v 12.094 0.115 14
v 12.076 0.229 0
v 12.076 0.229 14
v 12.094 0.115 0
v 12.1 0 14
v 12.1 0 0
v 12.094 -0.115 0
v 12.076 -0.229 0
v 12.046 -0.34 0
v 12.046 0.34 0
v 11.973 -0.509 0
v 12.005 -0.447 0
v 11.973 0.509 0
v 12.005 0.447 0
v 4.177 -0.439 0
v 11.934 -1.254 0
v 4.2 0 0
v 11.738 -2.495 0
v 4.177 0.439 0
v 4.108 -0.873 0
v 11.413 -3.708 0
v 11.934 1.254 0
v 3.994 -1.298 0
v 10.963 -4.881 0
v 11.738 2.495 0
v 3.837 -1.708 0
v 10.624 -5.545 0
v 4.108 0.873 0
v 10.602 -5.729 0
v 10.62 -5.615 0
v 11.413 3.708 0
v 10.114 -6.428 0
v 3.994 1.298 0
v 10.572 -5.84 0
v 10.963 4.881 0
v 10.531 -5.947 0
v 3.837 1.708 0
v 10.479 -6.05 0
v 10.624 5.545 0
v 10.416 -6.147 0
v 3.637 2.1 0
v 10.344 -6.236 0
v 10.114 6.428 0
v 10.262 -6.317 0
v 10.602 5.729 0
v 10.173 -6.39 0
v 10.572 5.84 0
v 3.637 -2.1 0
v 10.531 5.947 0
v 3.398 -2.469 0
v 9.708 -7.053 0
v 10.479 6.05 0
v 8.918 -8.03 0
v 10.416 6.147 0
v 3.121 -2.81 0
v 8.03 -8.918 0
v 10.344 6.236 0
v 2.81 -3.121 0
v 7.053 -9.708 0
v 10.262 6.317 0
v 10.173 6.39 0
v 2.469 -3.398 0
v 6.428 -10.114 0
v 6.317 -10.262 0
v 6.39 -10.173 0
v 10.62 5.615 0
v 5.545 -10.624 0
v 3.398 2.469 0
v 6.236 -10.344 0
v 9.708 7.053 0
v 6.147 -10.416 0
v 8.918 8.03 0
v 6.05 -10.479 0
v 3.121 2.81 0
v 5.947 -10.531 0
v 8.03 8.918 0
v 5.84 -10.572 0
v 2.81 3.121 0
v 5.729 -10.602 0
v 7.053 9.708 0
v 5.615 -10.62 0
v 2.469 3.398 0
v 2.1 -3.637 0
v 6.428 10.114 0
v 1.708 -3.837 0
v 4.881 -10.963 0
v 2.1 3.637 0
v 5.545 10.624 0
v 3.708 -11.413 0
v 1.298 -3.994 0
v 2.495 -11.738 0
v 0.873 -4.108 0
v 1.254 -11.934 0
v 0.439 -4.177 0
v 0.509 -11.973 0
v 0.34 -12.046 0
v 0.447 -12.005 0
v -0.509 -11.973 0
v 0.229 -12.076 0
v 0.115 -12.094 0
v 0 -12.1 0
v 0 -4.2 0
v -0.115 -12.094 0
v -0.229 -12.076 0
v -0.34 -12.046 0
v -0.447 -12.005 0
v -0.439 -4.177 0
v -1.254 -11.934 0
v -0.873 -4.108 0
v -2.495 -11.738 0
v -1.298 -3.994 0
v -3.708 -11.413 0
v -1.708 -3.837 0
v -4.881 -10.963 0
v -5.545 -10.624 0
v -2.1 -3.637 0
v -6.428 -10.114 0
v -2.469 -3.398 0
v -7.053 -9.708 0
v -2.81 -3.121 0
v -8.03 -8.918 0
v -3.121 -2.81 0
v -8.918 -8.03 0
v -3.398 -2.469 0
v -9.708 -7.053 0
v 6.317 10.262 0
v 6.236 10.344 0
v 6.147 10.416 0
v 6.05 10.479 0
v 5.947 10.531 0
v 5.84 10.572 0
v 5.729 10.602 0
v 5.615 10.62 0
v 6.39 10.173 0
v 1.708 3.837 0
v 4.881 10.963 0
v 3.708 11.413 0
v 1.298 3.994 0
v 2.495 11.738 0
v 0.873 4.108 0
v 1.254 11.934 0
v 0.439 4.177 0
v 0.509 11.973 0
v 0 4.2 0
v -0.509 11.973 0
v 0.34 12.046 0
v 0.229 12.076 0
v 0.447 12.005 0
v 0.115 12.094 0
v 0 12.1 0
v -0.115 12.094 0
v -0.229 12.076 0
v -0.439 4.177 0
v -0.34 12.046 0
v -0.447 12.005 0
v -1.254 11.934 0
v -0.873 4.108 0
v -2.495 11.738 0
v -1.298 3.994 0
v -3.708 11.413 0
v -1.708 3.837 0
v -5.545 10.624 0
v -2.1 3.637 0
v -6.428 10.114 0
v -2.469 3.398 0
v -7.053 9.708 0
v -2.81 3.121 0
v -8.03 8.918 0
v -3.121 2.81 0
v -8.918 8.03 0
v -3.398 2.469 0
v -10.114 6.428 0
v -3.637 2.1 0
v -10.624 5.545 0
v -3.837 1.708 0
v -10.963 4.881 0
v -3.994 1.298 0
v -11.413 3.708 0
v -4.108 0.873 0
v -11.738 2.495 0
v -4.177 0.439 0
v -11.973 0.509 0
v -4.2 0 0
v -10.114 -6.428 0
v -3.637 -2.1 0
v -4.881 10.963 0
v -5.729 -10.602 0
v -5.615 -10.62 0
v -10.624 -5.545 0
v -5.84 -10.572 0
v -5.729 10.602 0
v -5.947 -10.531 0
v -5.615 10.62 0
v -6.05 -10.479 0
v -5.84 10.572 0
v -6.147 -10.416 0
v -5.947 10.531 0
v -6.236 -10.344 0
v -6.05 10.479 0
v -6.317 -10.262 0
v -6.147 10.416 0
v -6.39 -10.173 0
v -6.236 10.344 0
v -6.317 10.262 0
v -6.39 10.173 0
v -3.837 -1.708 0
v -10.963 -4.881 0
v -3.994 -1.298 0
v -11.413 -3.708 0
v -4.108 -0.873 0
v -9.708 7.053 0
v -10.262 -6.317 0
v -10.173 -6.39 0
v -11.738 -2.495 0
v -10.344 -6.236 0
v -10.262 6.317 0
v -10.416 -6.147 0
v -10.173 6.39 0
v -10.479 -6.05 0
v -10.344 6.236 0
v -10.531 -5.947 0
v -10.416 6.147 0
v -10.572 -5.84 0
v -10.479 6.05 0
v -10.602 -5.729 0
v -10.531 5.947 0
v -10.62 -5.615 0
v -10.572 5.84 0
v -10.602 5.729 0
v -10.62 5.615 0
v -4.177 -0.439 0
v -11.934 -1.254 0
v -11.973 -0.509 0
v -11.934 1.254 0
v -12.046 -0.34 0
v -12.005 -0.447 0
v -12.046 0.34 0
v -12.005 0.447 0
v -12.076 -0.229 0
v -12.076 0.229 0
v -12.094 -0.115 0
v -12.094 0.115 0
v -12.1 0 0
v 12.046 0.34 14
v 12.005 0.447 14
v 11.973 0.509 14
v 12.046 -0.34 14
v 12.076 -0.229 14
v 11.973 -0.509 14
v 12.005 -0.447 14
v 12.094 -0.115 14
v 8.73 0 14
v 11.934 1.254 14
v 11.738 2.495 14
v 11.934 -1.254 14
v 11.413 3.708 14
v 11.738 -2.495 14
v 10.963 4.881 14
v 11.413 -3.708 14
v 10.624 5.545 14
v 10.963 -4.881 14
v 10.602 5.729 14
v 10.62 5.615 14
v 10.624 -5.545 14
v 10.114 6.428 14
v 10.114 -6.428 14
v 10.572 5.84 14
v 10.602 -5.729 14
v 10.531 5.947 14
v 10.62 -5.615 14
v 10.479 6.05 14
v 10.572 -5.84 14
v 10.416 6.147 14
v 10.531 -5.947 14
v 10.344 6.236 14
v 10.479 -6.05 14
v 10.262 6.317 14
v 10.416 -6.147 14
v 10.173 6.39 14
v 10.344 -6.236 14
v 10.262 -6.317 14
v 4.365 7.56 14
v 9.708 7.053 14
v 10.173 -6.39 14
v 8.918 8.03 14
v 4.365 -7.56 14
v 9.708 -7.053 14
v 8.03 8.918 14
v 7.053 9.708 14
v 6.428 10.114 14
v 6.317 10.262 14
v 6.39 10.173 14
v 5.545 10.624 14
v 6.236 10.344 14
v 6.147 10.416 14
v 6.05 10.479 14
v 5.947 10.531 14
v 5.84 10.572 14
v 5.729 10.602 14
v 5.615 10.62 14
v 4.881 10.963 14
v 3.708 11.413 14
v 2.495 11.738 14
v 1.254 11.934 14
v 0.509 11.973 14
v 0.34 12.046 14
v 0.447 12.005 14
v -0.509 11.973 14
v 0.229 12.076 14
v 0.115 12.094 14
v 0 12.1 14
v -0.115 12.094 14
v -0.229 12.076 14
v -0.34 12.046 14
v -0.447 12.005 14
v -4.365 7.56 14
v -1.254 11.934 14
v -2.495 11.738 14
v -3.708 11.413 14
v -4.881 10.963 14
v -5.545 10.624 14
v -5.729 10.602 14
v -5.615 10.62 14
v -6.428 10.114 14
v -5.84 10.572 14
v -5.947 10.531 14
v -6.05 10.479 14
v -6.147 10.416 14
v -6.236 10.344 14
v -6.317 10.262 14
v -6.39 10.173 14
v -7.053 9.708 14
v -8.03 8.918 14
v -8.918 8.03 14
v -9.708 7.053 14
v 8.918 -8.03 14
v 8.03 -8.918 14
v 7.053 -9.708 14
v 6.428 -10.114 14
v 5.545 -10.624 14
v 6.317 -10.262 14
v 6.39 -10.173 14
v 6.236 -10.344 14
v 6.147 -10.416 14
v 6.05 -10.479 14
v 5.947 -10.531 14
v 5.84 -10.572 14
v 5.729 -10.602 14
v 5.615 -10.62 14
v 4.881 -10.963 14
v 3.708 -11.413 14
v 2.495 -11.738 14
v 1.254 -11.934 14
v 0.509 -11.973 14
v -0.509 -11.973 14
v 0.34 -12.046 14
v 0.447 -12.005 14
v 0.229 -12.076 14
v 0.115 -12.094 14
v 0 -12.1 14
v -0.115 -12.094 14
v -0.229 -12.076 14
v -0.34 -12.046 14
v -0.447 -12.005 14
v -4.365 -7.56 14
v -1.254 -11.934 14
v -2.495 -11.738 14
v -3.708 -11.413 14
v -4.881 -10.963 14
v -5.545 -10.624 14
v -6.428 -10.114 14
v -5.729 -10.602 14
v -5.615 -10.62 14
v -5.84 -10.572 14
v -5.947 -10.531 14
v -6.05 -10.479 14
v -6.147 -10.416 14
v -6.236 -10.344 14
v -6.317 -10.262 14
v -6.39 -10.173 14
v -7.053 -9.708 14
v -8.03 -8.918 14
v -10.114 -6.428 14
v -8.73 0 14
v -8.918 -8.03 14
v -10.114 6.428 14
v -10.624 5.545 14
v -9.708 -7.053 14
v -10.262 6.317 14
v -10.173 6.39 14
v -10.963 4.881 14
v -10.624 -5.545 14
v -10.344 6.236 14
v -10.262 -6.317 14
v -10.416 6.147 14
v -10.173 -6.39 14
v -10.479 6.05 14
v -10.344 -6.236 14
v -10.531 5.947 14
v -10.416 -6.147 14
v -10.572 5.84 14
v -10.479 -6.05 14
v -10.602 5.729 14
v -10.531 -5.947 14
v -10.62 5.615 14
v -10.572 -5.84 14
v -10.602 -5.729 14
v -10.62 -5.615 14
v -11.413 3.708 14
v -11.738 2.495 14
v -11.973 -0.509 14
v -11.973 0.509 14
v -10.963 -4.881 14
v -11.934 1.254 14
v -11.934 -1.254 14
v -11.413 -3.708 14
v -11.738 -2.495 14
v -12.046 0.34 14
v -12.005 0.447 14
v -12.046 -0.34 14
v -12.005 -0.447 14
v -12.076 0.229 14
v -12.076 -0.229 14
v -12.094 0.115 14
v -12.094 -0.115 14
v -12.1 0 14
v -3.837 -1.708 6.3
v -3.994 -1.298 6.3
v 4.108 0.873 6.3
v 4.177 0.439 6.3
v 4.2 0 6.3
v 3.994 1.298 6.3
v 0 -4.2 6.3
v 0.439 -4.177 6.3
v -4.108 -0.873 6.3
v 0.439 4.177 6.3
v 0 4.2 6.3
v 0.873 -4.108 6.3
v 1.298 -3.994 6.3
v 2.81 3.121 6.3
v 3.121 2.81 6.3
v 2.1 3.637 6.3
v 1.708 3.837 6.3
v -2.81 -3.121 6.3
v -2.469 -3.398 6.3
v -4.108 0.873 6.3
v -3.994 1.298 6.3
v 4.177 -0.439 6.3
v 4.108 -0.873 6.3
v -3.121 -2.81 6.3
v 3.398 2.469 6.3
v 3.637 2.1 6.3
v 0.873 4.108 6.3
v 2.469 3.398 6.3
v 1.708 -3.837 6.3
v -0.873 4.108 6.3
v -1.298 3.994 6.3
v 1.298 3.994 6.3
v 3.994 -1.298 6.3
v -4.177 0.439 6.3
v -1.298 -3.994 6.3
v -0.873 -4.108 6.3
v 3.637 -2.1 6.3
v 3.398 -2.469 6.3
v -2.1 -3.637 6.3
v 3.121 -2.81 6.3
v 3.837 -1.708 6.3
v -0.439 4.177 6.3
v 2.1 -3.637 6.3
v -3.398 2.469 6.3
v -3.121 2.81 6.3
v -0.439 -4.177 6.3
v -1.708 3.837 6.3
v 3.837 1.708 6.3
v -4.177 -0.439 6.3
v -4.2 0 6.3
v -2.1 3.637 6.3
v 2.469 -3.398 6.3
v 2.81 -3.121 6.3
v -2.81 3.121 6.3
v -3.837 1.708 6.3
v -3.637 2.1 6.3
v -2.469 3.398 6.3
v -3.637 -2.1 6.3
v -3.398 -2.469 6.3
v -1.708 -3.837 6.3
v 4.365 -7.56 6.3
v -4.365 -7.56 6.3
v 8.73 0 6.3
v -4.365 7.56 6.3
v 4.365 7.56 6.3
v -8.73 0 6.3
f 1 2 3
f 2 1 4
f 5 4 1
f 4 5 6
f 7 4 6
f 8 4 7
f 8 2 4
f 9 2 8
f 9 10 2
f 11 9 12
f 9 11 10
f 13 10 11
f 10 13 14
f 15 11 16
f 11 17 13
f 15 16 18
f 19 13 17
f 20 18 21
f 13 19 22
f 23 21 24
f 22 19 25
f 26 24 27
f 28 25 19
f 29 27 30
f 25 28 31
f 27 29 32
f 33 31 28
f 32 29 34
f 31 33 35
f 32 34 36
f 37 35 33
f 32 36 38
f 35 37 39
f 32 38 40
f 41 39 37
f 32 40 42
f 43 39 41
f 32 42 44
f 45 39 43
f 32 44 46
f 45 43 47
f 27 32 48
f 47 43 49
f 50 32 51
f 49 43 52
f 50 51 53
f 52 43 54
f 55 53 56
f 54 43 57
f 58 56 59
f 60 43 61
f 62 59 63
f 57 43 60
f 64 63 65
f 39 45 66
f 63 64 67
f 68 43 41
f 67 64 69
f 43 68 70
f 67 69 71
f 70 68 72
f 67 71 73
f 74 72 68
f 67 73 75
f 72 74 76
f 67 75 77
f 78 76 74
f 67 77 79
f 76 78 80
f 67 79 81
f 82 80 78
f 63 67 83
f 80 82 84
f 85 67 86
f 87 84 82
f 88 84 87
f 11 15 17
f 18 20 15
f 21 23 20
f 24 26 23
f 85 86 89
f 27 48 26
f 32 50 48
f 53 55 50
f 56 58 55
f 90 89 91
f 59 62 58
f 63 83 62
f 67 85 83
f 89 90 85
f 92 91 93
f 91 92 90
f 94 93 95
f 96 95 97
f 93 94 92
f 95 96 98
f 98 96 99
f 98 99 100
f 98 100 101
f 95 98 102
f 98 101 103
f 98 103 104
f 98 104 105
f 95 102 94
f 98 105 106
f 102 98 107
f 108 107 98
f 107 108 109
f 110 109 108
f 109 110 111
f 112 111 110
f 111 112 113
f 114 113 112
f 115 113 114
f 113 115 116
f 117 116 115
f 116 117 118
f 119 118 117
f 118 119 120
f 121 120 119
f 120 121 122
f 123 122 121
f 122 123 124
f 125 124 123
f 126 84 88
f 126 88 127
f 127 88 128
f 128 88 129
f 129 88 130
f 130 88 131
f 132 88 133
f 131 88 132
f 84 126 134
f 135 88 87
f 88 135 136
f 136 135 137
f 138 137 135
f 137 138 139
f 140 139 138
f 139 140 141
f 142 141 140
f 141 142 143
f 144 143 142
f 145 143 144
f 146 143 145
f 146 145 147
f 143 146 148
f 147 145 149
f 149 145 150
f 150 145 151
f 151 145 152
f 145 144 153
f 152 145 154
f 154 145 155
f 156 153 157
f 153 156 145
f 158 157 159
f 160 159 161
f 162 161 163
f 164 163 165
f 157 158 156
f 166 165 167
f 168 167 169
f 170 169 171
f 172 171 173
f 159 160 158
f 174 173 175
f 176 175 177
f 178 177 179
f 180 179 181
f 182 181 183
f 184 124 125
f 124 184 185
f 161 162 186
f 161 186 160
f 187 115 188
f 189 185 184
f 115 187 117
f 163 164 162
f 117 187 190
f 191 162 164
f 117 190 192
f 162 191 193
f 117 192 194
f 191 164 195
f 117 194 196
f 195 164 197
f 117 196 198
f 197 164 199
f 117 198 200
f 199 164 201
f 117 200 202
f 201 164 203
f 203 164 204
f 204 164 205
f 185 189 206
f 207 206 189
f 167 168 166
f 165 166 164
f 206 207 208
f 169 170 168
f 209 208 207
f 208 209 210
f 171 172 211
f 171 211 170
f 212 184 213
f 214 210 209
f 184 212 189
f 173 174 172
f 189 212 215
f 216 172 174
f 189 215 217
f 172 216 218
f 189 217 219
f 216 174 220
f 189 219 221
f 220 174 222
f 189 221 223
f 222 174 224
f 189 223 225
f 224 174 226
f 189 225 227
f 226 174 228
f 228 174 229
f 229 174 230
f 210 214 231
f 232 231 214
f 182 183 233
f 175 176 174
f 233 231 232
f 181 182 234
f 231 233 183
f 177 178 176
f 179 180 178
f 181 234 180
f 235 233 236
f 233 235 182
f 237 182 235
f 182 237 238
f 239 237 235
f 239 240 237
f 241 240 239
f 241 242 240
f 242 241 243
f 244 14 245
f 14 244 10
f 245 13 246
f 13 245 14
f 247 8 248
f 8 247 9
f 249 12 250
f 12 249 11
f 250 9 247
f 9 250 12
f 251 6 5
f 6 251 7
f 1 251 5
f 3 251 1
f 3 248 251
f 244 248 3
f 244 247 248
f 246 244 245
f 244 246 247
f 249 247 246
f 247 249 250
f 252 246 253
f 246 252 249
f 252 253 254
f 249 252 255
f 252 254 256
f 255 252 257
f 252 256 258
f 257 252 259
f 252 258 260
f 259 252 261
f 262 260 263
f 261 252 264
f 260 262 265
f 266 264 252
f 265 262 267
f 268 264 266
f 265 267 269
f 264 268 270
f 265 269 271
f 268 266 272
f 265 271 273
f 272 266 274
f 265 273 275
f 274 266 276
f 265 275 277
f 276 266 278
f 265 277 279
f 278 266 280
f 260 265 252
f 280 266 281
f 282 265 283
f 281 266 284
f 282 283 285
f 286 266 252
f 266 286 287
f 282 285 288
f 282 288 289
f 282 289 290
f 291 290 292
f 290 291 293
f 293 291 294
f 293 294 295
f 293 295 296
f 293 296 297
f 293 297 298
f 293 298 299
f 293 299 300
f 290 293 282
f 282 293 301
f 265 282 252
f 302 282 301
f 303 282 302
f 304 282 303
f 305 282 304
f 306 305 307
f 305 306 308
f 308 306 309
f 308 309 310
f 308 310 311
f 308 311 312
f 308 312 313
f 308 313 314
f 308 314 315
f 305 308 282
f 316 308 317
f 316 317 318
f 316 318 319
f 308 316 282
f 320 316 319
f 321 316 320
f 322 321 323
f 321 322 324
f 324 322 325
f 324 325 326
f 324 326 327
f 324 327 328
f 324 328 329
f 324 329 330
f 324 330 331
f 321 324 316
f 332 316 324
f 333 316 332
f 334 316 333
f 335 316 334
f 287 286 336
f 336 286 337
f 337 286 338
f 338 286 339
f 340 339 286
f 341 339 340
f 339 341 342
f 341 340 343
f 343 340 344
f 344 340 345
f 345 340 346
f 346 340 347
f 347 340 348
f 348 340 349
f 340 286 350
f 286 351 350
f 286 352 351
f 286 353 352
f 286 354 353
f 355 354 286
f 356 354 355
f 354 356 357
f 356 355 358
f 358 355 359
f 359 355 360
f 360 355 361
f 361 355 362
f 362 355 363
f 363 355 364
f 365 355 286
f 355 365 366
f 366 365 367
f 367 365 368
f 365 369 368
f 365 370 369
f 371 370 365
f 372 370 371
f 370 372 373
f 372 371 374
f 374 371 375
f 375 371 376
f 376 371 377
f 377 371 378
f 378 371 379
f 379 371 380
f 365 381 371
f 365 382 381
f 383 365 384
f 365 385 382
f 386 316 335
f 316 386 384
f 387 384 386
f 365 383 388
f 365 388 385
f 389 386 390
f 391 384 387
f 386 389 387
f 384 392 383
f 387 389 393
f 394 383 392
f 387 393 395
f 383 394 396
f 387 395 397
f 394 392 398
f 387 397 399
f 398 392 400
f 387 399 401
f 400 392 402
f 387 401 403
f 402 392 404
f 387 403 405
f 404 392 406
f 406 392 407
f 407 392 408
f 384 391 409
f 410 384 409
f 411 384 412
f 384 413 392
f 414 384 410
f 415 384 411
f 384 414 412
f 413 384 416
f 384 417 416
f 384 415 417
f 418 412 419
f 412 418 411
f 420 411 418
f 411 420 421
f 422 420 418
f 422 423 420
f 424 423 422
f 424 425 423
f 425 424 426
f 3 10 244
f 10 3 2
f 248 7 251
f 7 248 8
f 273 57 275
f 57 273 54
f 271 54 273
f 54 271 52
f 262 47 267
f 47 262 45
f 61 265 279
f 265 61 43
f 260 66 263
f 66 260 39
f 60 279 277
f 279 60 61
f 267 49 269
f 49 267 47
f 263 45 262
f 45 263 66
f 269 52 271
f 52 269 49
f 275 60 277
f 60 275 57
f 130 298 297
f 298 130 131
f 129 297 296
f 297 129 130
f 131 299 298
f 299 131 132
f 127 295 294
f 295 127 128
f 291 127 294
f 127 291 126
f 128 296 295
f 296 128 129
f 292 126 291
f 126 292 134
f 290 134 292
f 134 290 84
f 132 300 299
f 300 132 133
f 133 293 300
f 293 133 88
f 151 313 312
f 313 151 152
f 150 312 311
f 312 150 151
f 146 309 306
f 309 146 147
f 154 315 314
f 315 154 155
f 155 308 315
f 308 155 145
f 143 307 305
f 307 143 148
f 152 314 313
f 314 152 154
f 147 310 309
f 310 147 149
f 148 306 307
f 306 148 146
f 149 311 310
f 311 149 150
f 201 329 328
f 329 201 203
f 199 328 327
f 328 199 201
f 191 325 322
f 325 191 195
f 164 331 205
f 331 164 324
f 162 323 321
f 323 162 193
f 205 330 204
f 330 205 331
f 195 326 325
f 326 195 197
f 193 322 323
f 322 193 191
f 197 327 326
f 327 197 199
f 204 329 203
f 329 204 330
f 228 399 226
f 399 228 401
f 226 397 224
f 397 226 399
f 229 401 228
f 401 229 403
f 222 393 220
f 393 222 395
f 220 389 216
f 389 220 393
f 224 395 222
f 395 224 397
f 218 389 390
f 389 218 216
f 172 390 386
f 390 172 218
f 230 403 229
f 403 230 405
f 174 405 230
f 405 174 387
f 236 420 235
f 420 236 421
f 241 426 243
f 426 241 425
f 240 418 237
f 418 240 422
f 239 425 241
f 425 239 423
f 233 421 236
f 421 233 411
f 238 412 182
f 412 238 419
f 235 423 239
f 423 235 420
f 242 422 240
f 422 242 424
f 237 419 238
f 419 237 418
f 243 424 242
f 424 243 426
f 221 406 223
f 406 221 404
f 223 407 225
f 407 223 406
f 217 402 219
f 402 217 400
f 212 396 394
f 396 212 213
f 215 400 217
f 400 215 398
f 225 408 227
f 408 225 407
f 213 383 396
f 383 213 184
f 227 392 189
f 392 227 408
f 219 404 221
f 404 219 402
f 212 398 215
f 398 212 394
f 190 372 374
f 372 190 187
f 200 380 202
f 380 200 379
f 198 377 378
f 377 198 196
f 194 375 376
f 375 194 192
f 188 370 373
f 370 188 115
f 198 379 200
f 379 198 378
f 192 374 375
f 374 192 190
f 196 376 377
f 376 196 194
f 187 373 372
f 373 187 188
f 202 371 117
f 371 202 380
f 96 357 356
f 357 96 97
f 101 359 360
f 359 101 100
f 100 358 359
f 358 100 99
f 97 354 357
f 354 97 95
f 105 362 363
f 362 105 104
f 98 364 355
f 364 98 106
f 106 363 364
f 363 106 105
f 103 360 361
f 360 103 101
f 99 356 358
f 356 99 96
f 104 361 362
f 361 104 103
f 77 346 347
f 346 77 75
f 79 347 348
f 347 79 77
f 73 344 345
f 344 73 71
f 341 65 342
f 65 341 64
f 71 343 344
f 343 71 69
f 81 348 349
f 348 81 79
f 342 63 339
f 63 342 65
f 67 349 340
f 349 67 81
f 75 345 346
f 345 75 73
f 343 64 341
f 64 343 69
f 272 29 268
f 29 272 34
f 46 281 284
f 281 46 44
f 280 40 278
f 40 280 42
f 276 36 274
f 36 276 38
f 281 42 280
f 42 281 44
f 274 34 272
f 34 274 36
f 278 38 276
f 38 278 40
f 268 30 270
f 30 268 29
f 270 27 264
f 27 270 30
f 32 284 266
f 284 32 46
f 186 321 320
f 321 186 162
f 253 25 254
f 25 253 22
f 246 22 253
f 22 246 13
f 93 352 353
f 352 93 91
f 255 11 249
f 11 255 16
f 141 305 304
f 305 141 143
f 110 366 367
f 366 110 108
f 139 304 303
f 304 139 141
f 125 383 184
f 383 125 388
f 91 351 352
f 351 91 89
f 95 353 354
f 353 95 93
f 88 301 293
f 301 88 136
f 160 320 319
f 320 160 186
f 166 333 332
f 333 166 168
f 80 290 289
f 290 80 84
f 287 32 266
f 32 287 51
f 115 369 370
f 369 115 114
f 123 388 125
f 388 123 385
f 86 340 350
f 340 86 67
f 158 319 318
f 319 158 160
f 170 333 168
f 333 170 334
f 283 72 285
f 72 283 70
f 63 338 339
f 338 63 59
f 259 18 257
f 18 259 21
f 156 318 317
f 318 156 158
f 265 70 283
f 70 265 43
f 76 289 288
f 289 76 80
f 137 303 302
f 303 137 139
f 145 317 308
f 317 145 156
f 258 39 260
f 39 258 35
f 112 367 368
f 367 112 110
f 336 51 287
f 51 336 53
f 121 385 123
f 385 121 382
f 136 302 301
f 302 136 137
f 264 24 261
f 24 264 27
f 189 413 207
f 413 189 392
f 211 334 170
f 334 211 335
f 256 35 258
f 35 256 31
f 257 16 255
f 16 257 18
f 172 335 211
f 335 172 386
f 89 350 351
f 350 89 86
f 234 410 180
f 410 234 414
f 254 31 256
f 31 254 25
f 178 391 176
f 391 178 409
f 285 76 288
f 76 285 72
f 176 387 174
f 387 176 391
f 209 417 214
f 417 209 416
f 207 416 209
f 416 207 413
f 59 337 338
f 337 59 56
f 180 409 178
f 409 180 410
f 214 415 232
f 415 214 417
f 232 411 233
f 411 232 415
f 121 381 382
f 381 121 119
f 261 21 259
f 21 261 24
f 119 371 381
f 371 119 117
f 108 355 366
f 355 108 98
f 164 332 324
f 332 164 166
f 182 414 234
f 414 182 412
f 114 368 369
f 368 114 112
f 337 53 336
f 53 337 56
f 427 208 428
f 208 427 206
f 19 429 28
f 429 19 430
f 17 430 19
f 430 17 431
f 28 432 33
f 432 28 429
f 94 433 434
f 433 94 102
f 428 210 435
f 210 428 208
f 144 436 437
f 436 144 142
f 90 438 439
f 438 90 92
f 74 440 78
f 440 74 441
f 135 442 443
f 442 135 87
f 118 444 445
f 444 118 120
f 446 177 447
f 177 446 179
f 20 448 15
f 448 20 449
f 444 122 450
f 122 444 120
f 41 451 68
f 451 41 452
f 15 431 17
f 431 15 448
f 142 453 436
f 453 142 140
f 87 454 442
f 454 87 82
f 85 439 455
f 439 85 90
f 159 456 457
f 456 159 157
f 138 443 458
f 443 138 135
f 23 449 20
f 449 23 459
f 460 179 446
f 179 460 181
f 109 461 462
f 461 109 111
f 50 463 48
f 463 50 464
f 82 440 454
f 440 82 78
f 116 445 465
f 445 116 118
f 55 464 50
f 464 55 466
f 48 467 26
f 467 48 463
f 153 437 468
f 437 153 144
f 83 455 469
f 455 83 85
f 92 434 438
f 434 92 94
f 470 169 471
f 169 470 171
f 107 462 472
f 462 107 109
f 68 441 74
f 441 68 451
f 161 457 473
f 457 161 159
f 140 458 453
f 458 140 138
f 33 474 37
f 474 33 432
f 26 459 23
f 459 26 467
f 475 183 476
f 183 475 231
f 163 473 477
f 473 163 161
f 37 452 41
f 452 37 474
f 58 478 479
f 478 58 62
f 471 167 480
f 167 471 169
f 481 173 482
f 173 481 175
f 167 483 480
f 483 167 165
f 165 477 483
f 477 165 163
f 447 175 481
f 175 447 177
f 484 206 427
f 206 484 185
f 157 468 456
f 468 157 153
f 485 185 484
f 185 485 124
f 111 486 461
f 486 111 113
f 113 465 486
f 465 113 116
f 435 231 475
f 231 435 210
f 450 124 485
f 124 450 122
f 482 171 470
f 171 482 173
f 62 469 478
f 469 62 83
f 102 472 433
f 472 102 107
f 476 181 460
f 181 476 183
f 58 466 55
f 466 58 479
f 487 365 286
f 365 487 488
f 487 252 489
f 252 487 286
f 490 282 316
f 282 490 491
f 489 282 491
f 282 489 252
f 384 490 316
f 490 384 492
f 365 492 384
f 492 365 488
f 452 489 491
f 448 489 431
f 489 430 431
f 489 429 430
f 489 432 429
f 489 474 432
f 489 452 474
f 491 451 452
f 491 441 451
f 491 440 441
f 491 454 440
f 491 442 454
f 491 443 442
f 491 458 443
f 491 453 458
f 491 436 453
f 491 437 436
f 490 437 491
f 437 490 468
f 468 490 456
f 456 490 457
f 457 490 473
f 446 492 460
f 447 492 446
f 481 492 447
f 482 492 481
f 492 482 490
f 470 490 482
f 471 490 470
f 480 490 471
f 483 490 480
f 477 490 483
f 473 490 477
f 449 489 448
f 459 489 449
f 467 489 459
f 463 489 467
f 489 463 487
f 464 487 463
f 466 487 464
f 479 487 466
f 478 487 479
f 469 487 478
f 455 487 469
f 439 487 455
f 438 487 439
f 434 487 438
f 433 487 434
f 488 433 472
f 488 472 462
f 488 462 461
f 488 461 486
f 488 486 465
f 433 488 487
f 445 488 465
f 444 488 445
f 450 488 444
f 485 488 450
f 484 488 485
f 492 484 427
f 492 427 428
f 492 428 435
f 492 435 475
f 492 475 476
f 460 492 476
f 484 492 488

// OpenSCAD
// Knurled-style thumb knob with hex socket.
$fn = 60;
eps = 0.02;
thread_d = 8.4;
knob_d = 24;
knob_h = 14;
socket_flat = thread_d * 1.8;
difference() {
    union() {
        cylinder(d = knob_d, h = knob_h);
        for (i = [0 : 11]) rotate([0, 0, i * 30]) translate([knob_d / 2 - 1, 0, 0]) cylinder(d = 2.2, h = knob_h);
    }
    translate([0, 0, -eps]) cylinder(d = thread_d, h = knob_h + 2 * eps);
    translate([0, 0, knob_h - knob_h * 0.55]) cylinder(d = socket_flat / cos(30), h = knob_h * 0.55 + eps, $fn = 6);
}
